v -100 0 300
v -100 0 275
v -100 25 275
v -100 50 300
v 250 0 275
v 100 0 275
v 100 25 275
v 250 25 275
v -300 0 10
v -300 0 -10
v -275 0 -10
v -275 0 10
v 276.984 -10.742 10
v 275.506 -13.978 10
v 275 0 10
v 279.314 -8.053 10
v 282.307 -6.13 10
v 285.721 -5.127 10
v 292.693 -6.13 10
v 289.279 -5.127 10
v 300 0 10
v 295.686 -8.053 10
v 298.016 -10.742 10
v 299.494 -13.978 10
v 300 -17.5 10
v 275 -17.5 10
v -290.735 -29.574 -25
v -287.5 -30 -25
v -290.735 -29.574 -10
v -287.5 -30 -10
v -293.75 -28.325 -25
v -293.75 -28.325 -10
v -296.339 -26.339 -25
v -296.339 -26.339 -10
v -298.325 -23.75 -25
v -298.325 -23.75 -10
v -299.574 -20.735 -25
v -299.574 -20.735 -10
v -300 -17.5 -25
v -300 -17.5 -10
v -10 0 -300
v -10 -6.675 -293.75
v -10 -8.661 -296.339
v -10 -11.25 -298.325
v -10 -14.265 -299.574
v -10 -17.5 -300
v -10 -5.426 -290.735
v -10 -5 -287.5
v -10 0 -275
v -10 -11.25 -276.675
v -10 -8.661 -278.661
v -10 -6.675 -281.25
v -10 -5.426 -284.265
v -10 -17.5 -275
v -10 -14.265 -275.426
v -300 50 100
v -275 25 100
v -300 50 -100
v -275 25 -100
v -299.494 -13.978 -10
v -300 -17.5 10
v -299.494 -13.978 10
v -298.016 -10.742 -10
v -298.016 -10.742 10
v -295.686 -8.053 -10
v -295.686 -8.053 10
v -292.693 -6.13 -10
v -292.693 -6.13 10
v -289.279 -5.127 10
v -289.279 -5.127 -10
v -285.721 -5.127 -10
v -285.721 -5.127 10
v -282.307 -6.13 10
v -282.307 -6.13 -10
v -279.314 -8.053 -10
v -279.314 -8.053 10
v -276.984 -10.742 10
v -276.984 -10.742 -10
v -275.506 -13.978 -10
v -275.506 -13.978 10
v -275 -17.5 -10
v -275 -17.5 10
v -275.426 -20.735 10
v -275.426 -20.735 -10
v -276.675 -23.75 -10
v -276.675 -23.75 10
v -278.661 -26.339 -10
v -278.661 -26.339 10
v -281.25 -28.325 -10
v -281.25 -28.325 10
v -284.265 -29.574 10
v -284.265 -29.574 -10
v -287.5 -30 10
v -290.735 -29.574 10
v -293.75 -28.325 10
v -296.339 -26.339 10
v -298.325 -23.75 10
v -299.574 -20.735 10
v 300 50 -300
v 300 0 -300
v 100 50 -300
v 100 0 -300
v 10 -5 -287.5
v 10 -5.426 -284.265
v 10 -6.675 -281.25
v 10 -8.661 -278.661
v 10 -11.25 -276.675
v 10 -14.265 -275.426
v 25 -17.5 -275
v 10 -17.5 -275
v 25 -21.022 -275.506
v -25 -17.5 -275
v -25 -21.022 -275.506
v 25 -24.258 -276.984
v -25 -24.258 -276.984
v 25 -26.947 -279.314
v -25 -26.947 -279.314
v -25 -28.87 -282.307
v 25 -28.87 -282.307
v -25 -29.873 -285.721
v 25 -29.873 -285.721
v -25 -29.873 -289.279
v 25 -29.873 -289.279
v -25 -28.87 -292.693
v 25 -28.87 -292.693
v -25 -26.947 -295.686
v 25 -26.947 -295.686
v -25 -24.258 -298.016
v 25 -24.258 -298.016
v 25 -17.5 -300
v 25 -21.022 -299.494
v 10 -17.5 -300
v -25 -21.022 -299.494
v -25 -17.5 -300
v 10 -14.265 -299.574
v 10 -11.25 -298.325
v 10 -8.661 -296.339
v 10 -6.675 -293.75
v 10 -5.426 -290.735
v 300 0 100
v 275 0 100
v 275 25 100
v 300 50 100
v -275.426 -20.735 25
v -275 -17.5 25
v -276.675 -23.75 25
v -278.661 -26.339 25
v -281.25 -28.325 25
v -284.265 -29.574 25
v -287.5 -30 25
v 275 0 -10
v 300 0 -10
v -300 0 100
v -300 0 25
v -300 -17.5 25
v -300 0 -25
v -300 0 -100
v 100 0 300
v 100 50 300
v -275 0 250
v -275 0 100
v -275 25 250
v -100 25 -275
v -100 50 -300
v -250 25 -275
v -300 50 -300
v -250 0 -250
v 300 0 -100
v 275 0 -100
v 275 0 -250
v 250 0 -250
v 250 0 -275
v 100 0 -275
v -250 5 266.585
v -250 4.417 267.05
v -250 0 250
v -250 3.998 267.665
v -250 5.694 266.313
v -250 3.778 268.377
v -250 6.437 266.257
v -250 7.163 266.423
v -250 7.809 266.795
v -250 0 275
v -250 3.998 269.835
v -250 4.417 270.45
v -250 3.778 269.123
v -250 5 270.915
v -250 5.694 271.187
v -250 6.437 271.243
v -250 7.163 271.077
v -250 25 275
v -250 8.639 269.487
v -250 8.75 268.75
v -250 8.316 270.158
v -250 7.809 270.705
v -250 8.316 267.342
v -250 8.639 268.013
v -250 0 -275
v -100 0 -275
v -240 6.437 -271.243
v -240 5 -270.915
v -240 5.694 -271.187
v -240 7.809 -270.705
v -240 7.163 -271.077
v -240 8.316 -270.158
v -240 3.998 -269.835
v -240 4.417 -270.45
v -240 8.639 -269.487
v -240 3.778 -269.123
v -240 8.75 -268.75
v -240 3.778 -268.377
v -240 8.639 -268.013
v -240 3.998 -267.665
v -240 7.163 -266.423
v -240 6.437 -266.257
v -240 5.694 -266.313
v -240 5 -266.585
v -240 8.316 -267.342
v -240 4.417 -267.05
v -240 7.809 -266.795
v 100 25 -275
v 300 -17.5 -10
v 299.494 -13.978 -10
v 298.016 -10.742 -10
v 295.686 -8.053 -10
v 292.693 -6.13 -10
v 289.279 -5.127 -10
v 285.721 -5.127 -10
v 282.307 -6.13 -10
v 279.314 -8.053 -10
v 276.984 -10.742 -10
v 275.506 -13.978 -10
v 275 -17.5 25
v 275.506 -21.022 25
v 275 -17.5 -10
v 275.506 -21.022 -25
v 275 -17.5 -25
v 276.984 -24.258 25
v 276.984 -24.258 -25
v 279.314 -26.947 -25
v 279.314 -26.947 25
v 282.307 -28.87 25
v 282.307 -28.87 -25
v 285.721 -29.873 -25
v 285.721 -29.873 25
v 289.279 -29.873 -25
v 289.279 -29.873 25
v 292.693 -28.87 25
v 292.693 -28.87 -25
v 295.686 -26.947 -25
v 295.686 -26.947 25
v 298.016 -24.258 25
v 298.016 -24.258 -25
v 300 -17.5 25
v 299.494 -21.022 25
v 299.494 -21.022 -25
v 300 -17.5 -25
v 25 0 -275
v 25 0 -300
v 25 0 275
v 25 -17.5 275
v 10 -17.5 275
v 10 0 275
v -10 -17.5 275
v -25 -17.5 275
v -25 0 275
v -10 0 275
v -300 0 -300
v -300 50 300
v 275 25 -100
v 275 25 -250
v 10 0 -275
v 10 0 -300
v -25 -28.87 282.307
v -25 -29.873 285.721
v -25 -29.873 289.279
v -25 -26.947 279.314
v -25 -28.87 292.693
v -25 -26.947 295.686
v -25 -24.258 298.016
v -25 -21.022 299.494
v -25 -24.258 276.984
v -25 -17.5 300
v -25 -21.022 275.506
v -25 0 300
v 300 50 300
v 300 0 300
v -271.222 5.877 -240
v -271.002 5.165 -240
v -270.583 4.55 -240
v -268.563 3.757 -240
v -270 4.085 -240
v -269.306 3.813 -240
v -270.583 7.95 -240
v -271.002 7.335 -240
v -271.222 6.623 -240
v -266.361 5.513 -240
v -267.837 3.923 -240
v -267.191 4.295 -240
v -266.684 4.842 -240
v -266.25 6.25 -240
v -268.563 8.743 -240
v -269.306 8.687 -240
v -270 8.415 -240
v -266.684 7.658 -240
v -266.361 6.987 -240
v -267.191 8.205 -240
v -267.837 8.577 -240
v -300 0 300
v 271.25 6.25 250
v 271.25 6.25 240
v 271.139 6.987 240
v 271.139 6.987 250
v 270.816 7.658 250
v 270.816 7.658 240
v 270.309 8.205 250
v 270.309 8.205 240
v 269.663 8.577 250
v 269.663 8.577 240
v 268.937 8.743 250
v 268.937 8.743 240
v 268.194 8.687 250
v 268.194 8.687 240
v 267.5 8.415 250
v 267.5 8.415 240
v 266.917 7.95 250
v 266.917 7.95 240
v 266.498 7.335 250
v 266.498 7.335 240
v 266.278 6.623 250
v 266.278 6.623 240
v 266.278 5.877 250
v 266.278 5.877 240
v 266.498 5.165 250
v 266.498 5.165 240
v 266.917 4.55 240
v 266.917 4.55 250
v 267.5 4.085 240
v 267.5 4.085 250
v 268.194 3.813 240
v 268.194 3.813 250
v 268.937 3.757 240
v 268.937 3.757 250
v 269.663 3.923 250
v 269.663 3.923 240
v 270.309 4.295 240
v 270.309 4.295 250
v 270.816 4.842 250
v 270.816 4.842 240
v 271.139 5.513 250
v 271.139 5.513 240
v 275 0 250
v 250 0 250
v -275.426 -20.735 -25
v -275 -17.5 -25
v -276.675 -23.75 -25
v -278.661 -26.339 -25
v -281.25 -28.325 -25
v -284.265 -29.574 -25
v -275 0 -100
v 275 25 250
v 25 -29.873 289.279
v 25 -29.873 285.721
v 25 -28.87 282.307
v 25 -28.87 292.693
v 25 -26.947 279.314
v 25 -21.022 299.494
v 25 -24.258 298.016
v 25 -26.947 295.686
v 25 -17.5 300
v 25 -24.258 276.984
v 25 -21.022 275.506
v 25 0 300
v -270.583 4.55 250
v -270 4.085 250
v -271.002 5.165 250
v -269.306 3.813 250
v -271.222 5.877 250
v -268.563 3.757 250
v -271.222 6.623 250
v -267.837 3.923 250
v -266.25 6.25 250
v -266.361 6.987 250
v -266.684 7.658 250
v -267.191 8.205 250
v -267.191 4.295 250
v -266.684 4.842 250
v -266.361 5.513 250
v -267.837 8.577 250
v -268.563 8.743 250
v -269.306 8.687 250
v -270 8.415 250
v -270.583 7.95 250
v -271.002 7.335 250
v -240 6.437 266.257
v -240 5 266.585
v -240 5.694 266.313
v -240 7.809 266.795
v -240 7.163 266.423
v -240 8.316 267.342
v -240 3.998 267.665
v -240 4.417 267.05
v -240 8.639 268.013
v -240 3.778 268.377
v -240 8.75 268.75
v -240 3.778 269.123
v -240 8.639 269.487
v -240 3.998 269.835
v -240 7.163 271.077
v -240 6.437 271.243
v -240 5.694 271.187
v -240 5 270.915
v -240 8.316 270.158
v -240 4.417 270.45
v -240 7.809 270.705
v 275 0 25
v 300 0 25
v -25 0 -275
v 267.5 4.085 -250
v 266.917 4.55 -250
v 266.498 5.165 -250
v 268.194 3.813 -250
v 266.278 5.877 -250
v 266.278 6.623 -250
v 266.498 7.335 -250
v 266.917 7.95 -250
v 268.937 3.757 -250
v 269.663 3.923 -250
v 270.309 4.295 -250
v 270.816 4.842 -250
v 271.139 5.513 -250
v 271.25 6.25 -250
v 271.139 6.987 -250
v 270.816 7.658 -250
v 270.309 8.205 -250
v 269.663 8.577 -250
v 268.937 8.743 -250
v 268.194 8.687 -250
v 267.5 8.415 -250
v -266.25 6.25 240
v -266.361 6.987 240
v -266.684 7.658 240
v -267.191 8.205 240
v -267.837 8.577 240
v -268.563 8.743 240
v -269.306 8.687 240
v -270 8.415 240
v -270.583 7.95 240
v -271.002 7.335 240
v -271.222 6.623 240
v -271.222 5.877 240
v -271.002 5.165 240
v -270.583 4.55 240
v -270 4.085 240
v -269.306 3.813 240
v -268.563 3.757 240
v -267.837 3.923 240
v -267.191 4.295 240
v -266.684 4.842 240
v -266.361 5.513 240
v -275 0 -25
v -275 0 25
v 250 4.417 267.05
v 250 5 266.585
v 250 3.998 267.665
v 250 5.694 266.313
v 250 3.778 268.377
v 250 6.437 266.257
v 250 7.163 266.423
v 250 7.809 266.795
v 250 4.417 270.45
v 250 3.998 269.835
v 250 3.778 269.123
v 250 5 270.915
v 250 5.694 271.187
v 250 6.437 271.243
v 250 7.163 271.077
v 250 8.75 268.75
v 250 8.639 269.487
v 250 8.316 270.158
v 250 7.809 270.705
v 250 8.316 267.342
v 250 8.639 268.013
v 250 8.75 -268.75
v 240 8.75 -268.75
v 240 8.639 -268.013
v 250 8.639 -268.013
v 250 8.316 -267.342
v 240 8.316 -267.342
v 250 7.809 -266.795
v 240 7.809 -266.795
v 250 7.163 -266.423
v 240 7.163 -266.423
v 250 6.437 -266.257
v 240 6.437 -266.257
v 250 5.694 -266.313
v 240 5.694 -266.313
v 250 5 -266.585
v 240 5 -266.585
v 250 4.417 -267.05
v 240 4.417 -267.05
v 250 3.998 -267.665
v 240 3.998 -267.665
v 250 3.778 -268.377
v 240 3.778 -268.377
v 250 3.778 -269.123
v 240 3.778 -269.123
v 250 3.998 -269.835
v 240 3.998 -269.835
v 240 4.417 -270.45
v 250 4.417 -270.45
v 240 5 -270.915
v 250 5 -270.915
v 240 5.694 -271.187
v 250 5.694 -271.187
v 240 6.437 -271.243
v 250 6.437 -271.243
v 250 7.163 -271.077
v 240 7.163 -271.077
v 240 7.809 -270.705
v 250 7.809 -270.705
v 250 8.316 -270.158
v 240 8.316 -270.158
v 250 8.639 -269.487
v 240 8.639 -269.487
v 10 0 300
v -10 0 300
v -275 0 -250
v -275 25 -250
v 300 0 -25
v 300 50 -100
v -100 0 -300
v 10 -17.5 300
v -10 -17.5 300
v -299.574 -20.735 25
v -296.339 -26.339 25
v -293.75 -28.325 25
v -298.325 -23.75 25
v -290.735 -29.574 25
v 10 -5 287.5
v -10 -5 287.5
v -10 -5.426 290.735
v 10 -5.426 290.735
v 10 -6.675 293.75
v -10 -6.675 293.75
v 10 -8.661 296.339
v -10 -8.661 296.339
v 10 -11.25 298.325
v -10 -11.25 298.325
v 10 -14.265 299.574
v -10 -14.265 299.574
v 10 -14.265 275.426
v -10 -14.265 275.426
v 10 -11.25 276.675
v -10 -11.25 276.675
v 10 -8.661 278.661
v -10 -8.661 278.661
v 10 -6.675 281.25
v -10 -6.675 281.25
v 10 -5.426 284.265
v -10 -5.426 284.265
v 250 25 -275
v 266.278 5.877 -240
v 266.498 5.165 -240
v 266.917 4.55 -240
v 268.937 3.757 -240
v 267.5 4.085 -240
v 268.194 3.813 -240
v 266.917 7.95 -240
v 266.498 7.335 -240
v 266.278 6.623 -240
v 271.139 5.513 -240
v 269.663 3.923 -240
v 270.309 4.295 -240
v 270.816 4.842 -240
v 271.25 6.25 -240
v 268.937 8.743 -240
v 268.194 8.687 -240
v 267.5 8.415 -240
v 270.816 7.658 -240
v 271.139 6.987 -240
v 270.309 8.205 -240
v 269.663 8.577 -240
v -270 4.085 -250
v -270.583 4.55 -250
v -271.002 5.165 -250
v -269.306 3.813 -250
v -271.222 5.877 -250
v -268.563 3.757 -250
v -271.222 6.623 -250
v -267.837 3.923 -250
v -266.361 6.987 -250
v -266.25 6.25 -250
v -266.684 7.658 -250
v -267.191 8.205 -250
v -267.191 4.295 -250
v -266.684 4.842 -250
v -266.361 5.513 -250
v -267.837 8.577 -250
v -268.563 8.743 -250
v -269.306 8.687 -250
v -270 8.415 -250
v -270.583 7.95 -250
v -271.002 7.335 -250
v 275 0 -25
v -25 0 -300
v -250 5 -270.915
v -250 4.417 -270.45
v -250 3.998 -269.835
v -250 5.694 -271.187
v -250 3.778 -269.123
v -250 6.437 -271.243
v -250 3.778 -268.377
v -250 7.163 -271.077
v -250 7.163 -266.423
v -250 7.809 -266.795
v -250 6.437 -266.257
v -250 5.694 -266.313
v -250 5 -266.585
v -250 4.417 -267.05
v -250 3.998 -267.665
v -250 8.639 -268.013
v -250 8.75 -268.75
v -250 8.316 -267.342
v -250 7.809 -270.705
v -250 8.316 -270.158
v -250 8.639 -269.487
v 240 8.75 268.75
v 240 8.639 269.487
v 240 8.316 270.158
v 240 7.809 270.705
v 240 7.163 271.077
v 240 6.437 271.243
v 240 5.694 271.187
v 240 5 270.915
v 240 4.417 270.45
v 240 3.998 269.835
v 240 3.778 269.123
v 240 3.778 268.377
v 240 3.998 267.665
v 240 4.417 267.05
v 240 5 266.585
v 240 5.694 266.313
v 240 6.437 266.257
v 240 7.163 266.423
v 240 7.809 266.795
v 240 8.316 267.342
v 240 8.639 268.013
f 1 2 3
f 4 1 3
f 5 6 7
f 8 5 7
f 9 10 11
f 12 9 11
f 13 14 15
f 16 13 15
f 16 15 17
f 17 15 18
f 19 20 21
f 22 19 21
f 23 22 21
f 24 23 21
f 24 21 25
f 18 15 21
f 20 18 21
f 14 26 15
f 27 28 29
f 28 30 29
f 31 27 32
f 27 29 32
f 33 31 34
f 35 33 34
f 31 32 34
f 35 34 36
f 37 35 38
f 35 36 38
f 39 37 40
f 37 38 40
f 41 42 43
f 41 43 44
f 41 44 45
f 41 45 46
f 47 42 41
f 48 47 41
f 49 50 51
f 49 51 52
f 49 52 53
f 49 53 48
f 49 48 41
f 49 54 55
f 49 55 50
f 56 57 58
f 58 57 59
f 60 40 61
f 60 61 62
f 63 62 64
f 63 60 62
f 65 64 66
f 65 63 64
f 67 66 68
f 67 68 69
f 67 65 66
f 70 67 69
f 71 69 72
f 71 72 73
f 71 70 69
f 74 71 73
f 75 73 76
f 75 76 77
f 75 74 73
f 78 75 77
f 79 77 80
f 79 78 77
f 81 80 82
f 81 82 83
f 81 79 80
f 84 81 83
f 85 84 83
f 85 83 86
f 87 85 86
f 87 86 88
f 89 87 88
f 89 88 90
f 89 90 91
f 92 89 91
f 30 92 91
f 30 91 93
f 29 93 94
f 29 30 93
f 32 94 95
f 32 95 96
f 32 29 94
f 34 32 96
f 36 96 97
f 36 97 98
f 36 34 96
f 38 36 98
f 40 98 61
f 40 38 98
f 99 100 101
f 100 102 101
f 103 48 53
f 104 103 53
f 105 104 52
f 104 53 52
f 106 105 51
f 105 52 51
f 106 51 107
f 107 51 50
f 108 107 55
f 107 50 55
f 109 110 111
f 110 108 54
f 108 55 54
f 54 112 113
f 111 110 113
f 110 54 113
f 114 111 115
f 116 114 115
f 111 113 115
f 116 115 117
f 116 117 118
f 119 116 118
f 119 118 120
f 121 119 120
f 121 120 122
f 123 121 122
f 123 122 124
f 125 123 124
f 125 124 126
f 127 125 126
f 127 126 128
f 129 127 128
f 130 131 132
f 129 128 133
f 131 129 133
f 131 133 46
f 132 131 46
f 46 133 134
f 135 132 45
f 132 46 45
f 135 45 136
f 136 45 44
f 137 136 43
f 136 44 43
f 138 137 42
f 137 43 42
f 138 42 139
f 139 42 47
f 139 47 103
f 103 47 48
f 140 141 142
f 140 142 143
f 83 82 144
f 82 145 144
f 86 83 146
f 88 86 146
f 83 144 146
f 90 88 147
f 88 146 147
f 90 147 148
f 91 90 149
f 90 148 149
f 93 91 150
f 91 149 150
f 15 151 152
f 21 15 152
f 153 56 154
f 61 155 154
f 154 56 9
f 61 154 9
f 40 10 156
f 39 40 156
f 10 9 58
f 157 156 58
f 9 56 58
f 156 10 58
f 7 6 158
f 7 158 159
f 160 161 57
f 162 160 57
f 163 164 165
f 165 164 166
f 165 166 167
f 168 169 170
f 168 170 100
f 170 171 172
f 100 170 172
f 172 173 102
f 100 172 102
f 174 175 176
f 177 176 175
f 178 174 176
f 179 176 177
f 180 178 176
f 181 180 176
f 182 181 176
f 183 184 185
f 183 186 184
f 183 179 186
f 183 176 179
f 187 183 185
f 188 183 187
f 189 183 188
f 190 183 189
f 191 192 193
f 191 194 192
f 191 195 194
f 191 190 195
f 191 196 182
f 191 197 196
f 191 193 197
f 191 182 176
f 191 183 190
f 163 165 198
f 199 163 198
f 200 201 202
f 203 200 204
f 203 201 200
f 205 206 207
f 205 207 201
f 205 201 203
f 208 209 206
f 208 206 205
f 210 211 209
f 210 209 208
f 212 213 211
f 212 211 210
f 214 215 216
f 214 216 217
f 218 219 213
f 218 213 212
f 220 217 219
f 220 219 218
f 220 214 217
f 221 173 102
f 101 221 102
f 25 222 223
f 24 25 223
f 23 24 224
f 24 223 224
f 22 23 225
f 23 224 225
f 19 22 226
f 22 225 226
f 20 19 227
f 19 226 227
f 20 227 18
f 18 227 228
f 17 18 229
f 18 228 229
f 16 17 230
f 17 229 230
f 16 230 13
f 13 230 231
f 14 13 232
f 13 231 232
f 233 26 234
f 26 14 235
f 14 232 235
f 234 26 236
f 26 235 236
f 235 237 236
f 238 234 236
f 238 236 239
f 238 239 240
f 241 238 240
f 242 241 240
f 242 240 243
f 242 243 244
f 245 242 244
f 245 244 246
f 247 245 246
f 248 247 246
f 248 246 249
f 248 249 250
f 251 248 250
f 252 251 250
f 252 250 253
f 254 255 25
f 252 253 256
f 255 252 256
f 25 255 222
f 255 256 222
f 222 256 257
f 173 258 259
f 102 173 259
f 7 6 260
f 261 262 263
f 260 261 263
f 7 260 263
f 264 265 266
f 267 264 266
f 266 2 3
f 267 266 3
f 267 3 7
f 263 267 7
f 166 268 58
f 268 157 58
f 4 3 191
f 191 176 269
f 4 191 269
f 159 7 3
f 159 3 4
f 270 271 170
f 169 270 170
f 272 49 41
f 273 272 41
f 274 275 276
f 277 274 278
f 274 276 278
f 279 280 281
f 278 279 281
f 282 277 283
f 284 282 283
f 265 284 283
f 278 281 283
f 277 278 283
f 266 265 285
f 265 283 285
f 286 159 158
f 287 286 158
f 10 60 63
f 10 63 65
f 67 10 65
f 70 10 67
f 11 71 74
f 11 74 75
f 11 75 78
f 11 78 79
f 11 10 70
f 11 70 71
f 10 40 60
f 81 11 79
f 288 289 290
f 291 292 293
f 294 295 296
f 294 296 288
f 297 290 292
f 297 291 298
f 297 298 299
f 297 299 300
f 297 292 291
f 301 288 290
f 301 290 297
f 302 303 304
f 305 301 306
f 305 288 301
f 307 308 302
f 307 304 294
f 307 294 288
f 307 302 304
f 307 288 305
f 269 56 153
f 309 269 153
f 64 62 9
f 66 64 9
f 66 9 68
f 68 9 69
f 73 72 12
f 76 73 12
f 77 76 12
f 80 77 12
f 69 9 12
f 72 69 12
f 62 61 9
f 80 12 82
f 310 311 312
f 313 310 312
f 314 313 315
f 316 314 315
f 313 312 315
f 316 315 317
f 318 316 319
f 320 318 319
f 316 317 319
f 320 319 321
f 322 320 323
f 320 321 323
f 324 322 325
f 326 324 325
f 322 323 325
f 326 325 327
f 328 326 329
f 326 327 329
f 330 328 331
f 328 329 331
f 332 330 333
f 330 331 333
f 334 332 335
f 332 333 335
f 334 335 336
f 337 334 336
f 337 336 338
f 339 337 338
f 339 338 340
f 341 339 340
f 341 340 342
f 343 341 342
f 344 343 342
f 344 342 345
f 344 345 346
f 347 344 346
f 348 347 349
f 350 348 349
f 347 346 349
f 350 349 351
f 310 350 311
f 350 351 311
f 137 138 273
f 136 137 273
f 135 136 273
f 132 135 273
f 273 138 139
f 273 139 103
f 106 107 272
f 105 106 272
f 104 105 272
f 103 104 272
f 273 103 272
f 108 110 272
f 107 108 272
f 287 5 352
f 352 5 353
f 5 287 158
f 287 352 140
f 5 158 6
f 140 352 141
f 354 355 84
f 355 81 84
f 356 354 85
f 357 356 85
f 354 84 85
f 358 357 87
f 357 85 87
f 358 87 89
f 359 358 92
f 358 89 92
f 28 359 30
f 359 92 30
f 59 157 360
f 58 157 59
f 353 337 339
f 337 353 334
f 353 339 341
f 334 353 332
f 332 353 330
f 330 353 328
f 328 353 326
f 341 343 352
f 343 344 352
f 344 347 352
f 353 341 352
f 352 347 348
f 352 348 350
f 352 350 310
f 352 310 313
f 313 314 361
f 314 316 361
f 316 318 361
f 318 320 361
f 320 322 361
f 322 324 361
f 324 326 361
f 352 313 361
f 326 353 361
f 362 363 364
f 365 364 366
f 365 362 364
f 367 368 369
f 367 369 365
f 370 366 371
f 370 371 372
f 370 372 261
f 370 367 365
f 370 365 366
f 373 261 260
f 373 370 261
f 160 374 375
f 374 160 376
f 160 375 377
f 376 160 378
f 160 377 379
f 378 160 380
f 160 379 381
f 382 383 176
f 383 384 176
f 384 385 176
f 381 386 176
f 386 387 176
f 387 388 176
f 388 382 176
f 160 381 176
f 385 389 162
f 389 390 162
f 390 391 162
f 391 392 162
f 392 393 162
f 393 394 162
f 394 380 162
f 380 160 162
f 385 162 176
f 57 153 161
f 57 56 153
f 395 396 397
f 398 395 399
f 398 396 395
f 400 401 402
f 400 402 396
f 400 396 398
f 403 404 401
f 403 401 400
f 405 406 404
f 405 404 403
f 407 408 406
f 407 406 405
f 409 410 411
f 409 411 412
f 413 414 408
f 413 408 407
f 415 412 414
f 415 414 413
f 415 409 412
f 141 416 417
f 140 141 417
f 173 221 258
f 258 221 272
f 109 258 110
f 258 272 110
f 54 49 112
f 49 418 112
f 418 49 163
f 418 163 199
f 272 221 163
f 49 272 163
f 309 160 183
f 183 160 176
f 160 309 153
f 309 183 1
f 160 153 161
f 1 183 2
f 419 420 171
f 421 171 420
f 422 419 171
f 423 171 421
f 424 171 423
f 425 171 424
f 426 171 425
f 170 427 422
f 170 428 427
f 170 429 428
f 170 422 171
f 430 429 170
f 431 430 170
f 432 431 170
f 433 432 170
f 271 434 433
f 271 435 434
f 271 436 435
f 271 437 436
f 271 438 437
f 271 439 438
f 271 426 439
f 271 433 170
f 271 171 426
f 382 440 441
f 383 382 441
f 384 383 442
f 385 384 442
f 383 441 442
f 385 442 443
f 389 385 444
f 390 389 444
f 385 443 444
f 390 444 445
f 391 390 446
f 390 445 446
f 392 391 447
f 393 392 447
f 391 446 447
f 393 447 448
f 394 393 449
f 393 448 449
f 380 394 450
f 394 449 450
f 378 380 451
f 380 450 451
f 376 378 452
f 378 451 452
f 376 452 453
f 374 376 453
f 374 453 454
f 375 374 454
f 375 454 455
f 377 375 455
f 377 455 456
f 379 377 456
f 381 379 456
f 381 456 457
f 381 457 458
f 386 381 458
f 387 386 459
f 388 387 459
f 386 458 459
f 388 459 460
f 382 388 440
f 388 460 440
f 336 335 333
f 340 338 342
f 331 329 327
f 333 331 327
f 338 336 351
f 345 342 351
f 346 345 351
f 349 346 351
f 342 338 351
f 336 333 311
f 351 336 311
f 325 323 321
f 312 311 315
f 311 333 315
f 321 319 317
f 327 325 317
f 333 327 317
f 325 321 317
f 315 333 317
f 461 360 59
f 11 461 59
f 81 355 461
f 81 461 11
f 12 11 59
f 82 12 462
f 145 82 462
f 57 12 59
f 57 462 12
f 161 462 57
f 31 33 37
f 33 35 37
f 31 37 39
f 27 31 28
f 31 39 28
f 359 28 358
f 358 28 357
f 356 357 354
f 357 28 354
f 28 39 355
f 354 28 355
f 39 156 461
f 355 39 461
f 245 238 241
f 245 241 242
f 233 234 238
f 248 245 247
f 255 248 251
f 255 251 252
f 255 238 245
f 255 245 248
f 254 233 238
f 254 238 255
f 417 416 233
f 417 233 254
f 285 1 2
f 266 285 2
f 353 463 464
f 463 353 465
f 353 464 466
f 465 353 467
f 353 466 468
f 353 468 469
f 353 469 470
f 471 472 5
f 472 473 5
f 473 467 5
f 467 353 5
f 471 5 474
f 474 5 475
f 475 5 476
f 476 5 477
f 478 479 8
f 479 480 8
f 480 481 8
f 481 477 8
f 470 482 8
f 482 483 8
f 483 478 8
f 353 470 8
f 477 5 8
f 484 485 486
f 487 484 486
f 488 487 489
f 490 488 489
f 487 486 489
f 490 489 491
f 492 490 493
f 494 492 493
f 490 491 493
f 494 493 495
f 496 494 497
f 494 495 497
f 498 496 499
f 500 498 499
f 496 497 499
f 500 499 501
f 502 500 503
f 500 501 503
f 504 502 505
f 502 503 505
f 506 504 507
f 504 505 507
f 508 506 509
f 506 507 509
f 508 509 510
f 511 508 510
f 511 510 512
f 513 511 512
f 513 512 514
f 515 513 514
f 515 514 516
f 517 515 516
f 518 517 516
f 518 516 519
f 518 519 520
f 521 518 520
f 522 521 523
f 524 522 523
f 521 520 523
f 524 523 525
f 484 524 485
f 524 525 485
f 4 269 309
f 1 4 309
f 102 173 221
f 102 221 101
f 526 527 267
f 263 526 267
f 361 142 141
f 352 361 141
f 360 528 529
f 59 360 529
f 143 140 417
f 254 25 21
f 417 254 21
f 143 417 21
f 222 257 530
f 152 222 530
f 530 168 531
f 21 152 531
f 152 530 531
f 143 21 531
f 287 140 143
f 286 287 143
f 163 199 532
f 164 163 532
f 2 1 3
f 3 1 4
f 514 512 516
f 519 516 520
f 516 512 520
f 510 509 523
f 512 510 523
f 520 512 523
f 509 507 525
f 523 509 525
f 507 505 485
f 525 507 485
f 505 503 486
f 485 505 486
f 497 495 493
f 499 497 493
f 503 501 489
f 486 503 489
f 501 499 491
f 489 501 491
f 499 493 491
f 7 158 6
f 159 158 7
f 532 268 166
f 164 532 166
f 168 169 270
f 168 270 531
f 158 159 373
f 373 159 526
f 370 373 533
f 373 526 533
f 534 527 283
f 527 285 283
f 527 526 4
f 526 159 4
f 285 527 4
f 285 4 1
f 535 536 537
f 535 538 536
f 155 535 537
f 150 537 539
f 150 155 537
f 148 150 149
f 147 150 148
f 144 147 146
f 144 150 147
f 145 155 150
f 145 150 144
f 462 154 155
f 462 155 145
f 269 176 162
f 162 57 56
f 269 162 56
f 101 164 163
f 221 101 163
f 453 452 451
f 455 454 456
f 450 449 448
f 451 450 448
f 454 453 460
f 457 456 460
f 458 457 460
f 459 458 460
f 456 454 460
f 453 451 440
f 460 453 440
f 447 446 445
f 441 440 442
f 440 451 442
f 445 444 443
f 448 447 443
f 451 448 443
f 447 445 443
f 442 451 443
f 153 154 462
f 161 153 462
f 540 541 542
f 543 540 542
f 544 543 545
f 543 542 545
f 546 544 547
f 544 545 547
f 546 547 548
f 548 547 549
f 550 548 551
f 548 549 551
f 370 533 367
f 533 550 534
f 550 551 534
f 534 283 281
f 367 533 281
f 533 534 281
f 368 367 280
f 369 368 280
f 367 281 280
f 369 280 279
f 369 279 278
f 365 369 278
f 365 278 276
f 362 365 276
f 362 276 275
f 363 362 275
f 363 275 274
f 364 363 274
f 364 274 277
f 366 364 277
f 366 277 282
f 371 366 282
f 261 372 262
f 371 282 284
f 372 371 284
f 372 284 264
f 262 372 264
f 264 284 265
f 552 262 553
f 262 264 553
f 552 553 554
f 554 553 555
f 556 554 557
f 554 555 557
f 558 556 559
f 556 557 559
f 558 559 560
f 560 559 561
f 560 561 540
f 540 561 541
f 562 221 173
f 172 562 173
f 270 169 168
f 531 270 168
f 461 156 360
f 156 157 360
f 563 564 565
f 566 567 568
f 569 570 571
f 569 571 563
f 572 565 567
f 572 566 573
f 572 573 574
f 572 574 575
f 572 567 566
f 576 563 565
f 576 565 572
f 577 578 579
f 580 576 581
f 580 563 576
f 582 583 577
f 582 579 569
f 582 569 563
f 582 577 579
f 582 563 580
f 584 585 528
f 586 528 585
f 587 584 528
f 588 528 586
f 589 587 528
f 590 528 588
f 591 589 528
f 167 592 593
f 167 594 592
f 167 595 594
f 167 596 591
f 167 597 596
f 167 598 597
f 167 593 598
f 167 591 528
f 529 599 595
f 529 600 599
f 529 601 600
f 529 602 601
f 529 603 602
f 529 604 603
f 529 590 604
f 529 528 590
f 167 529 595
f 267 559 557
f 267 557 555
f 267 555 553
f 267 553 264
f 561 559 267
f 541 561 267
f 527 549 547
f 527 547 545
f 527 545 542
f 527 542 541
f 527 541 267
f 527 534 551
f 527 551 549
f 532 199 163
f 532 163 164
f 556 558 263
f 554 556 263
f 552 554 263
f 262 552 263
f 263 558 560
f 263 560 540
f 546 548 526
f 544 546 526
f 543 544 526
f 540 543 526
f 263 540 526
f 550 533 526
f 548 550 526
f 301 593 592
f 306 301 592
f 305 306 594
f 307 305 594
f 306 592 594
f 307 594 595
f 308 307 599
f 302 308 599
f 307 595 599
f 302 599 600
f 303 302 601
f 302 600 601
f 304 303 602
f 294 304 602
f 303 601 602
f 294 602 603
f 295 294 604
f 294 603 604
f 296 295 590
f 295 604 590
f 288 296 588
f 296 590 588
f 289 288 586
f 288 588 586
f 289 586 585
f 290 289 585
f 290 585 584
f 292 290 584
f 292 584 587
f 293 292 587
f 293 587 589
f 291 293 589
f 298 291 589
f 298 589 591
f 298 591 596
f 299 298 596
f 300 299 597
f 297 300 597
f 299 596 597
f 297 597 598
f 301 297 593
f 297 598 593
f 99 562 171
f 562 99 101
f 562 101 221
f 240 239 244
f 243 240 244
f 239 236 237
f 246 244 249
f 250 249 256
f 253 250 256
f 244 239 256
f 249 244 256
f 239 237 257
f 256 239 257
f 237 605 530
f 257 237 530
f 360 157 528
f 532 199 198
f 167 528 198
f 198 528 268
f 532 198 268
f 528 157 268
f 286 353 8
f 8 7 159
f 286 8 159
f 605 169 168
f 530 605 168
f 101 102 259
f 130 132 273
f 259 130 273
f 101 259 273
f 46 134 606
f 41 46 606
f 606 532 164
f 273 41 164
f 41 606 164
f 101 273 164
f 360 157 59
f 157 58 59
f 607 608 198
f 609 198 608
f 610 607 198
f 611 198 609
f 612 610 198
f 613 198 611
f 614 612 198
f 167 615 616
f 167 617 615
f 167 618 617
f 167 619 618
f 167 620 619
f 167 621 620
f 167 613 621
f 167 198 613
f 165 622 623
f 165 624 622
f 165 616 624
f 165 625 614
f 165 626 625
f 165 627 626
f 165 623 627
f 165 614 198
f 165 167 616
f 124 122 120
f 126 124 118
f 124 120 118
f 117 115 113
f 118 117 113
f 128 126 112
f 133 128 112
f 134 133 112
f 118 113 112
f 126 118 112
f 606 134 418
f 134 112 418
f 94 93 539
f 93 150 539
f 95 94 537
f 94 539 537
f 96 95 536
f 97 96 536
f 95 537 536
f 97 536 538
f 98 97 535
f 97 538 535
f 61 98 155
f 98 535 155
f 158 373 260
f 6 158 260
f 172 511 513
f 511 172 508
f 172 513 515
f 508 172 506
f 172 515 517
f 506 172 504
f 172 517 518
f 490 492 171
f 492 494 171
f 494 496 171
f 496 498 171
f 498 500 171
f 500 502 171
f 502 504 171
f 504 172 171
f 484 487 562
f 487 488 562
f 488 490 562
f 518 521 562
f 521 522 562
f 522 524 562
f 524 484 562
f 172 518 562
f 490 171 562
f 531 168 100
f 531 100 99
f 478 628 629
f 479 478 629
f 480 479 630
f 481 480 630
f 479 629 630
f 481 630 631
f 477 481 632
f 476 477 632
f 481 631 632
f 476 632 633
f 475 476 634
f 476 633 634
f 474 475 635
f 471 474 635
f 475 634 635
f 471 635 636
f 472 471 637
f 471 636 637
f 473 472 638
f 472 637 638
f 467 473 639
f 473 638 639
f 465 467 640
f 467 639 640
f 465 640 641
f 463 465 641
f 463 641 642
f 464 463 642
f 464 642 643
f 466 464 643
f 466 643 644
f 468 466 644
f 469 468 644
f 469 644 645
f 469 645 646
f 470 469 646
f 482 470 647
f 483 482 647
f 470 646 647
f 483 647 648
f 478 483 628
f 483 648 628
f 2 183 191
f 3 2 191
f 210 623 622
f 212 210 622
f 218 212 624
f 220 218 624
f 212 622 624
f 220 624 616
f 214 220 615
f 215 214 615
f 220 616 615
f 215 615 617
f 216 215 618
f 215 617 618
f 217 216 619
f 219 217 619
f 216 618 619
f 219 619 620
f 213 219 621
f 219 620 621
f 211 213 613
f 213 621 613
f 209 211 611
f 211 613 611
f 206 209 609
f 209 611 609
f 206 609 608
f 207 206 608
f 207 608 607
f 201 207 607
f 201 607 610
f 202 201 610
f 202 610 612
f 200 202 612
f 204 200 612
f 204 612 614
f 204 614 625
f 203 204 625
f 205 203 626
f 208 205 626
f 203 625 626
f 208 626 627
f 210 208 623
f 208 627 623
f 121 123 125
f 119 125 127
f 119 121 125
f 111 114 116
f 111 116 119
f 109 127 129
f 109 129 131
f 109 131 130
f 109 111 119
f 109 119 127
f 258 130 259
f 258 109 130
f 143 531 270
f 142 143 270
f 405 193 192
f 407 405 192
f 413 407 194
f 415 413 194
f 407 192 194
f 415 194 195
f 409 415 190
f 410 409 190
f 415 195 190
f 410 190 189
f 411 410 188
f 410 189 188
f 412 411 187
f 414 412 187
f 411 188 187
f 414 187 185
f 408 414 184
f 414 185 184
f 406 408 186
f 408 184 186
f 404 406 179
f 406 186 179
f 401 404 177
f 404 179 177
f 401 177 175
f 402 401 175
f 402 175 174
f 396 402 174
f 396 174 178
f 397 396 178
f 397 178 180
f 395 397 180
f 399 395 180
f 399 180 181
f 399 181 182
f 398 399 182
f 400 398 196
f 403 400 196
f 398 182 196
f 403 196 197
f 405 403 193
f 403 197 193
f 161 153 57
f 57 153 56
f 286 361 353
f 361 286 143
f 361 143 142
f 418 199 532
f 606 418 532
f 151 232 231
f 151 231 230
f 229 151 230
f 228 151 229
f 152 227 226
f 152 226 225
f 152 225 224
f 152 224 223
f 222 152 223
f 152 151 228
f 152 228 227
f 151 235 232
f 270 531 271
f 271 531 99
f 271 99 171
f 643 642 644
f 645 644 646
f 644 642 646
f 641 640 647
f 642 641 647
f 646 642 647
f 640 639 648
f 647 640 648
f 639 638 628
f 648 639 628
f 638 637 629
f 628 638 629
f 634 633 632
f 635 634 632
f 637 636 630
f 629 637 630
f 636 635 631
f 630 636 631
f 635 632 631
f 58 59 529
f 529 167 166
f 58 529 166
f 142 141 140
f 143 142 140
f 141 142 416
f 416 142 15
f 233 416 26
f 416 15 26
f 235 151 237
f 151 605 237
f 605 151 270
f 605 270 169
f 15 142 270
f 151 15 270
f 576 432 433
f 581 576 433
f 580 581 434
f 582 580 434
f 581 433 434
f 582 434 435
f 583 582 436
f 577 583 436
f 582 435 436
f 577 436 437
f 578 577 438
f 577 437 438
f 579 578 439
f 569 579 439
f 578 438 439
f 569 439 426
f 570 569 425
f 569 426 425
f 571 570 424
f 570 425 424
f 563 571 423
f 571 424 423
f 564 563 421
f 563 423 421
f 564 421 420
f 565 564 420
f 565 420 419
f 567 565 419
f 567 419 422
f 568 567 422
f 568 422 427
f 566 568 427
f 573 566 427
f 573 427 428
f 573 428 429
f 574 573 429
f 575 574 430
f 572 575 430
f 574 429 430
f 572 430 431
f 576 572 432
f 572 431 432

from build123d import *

# Parameters (mm, degrees)
SKETCH1_W                                  = 700
SKETCH1_H                                  = 700
SKETCH1_W_2                                = 500
SKETCH1_H_2                                = 500
BOSS_EXTRUDE2_DEPTH                        = 50
BOSS_EXTRUDE2_DRAFT                        = 45
SKETCH6_W                                  = 700
SKETCH6_H                                  = 700
SKETCH6_W_2                                = 600
SKETCH6_H_2                                = 600
CUT_EXTRUDE1_DEPTH                         = 50
CUT_EXTRUDE2_DEPTH                         = 25
SKETCH8_R                                  = 2.5
BOSS_EXTRUDE3_DEPTH                        = 10
MIRROR1_AT_THE_SECOND_PLANE_COPY_1_SKETC_R = 2.5
MIRROR1_AT_THE_SECOND_PLANE_COPY_1_DEPTH   = 10
MIRROR2_COPY_1_SKETCH_R                    = 2.5
MIRROR2_COPY_1_DEPTH                       = 10
MIRROR2_COPY_2_SKETCH_R                    = 2.5
MIRROR2_COPY_2_DEPTH                       = 10
MIRROR2_COPY_3_SKETCH_R                    = 2.5
MIRROR2_COPY_3_DEPTH                       = 10
SKETCH9_W                                  = 25
SKETCH9_H                                  = 15
BOSS_EXTRUDE4_DEPTH                        = 30
SKETCH11_R                                 = 12.5
BOSS_EXTRUDE5_DEPTH                        = 50
FILLET1_R                                  = 12.5
FILLET1_OF_MIRROR3_R                       = 12.5
MIRROR4_START                              = -25
MIRROR4_OUTLINE_R                          = 12.5
MIRROR4_DEPTH                              = 50
MIRROR4_2_DEPTH                            = 15
MIRROR4_START_2                            = 10
MIRROR4_3_DEPTH                            = 15
INTERSECT1_START                           = -300
INTERSECT1_DEPTH                           = 200
INTERSECT1_2_DEPTH                         = 50
INTERSECT1_START_2                         = -250
INTERSECT1_3_OUTLINE_R                     = 2.5
INTERSECT1_3_DEPTH                         = 10
INTERSECT1_4_DEPTH                         = 200
INTERSECT1_START_3                         = -279.452
INTERSECT1_5_DEPTH                         = 29.452
INTERSECT1_6_OUTLINE_R                     = 2.5
INTERSECT1_6_DEPTH                         = 10
INTERSECT1_7_DEPTH                         = 600
INTERSECT1_8_DEPTH                         = 200
INTERSECT1_START_4                         = 100
INTERSECT1_9_DEPTH                         = 200
INTERSECT1_START_5                         = -100
INTERSECT1_10_DEPTH                        = 200
INTERSECT1_START_6                         = -25
INTERSECT1_11_OUTLINE_R                    = 12.5
INTERSECT1_11_DEPTH                        = 50
INTERSECT1_12_DEPTH                        = 15
INTERSECT1_START_7                         = 10
INTERSECT1_13_DEPTH                        = 15
INTERSECT1_14_DEPTH                        = 200
INTERSECT1_START_8                         = 250
INTERSECT1_15_DEPTH                        = 50
INTERSECT1_START_9                         = 240
INTERSECT1_16_OUTLINE_R                    = 2.5
INTERSECT1_16_DEPTH                        = 10
INTERSECT1_17_DEPTH                        = 200
INTERSECT1_START_10                        = -280.548
INTERSECT1_18_DEPTH                        = 30.548
INTERSECT1_19_OUTLINE_R                    = 2.5
INTERSECT1_19_DEPTH                        = 10
INTERSECT1_20_DEPTH                        = 200
INTERSECT1_21_OUTLINE_R                    = 12.5
INTERSECT1_21_DEPTH                        = 50
INTERSECT1_22_DEPTH                        = 15
INTERSECT1_23_DEPTH                        = 15
INTERSECT1_24_DEPTH                        = 200
INTERSECT1_25_OUTLINE_R                    = 12.5
INTERSECT1_25_DEPTH                        = 50
INTERSECT1_26_DEPTH                        = 15
INTERSECT1_27_DEPTH                        = 15
INTERSECT1_28_DEPTH                        = 200
INTERSECT1_29_DEPTH                        = 50
INTERSECT1_30_OUTLINE_R                    = 2.5
INTERSECT1_30_DEPTH                        = 10
INTERSECT1_31_DEPTH                        = 200
INTERSECT1_32_DEPTH                        = 30.548
INTERSECT1_33_OUTLINE_R                    = 2.5
INTERSECT1_33_DEPTH                        = 10
INTERSECT1_34_DEPTH                        = 200
INTERSECT1_35_DEPTH                        = 50
INTERSECT1_36_OUTLINE_R                    = 2.5
INTERSECT1_36_DEPTH                        = 10
INTERSECT1_37_DEPTH                        = 200
INTERSECT1_38_DEPTH                        = 30.548
INTERSECT1_39_OUTLINE_R                    = 2.5
INTERSECT1_39_DEPTH                        = 10


with BuildPart() as part:
    # Sketch1 → Boss-Extrude2 (with draft: the straight prism first)
    with BuildSketch(Plane(origin=(0, 0, 0), x_dir=(1, 0, 0), z_dir=(0, 1, 0))):
        Rectangle(SKETCH1_W, SKETCH1_H)
        Rectangle(SKETCH1_W_2, SKETCH1_H_2, mode=Mode.SUBTRACT)
    extrude(amount=BOSS_EXTRUDE2_DEPTH)
    # Boss-Extrude2: the draft: its side faces are tilted about the plane it starts from
    boss_extrude2_sides = [part.faces().sort_by_distance(p)[0] for p in [
        (-350, 25, 0),
        (0, 25, 350),
        (350, 25, 0),
        (0, 25, -350),
        (250, 25, 0),
        (0, 25, 250),
        (-250, 25, 0),
        (0, 25, -250),
    ]]
    draft(boss_extrude2_sides, Plane(origin=(0, 0, 0), x_dir=(1, 0, 0), z_dir=(0, 1, 0)), BOSS_EXTRUDE2_DRAFT)

    # Sketch6 → Cut-Extrude1 (cut)
    with BuildSketch(Plane(origin=(0, 50, 0), x_dir=(1, 0, 0), z_dir=(0, 1, 0))):
        Rectangle(SKETCH6_W, SKETCH6_H)
        Rectangle(SKETCH6_W_2, SKETCH6_H_2, mode=Mode.SUBTRACT)
    extrude(amount=-CUT_EXTRUDE1_DEPTH, mode=Mode.SUBTRACT)

    # Sketch7 → Cut-Extrude2 (cut)
    with BuildSketch(Plane.XZ):
        Polygon((-275, 250), (-250, 250), (-250, 275), (250, 275), (250, 250), (275, 250), (275, -250), (250, -250), (250, -275), (-250, -275), (-250, -250), (-275, -250), align=None)
    extrude(amount=-CUT_EXTRUDE2_DEPTH, mode=Mode.SUBTRACT)

    # Sketch8 → Boss-Extrude3 (add)
    with BuildSketch(Plane.XY.offset(-250)):
        with Locations(Location((-268.75, 6.25, 0), (0, 0, 180))):
            Circle(SKETCH8_R)
    boss_extrude3 = extrude(amount=BOSS_EXTRUDE3_DEPTH)

    # Mirror1: Boss-Extrude3 across plane
    add(boss_extrude3.mirror(Plane(origin=(0, 0, 0), x_dir=(0, 0, 1), z_dir=(1, 0, 0))))

    # Mirror1 at the second plane: Boss-Extrude3 across plane
    add(boss_extrude3.mirror(Plane.XY))

    # Mirror1 at the second plane copy 1 sketc → Mirror1 at the second plane copy 1 (add)
    with BuildSketch(Plane(origin=(0, 0, 250), x_dir=(-1, 0, 0), z_dir=(0, 0, -1))):
        with Locations(Location((-268.75, 6.25, 0), (0, 0, 180))):
            Circle(MIRROR1_AT_THE_SECOND_PLANE_COPY_1_SKETC_R)
    extrude(amount=MIRROR1_AT_THE_SECOND_PLANE_COPY_1_DEPTH)

    # Mirror2: Boss-Extrude3 across plane
    add(boss_extrude3.mirror(Plane(origin=(0, 0, 0), x_dir=(0.7071067811865477, 0, 0.7071067811865474), z_dir=(-0.7071067811865474, 0, 0.7071067811865477))))

    # Mirror2 copy 1 sketch → Mirror2 copy 1 (add)
    with BuildSketch(Plane(origin=(-250, 0, 0), x_dir=(0, 0, -1), z_dir=(1, 0, 0))):
        with Locations(Location((-268.75, 6.25, 0), (0, 0, 180))):
            Circle(MIRROR2_COPY_1_SKETCH_R)
    extrude(amount=MIRROR2_COPY_1_DEPTH)

    # Mirror2 copy 2 sketch → Mirror2 copy 2 (add)
    with BuildSketch(Plane.ZY.offset(-250)):
        with Locations(Location((-268.75, 6.25, 0), (0, 0, 180))):
            Circle(MIRROR2_COPY_2_SKETCH_R)
    extrude(amount=MIRROR2_COPY_2_DEPTH)

    # Mirror2 copy 3 sketch → Mirror2 copy 3 (add)
    with BuildSketch(Plane(origin=(250, 0, 0), x_dir=(0, 0, -1), z_dir=(-1, 0, 0))):
        with Locations((-268.75, -6.25)):
            Circle(MIRROR2_COPY_3_SKETCH_R)
    extrude(amount=MIRROR2_COPY_3_DEPTH)

    # Sketch9 → Boss-Extrude4 (add)
    with BuildSketch(Plane.XZ):
        with Locations((-287.5, 17.5)):
            Rectangle(SKETCH9_W, SKETCH9_H)
        with Locations((-287.5, -17.5)):
            Rectangle(SKETCH9_W, SKETCH9_H)
    boss_extrude4 = extrude(amount=BOSS_EXTRUDE4_DEPTH)

    # Sketch11 → Boss-Extrude5 (add)
    with BuildSketch(Plane(origin=(0, 0, -25), x_dir=(-1, 0, 0), z_dir=(0, 0, -1))):
        with Locations((287.5, -17.5)):
            Circle(SKETCH11_R)
    boss_extrude5 = extrude(amount=-BOSS_EXTRUDE5_DEPTH)

    # Fillet1
    fillet1_edges = [part.edges().sort_by_distance(p)[0] for p in [
        (-275, -30, -17.5),
        (-275, -30, 17.5),
        (-300, -30, 17.5),
        (-300, -30, -17.5),
    ]]
    fillet(fillet1_edges, radius=FILLET1_R - 0.0001)  # a hair under: the kernel refuses the full size

    # Mirror3: Boss-Extrude4, Boss-Extrude5 across plane
    add(boss_extrude4.mirror(Plane(origin=(0, 0, 0), x_dir=(0, 0, 1), z_dir=(1, 0, 0))))
    add(boss_extrude5.mirror(Plane(origin=(0, 0, 0), x_dir=(0, 0, 1), z_dir=(1, 0, 0))))

    # Fillet1 of Mirror3
    fillet1_of_mirror3_edges = [part.edges().sort_by_distance(p)[0] for p in [
        (275, -30, -17.5),
        (275, -30, 17.5),
        (300, -30, 17.5),
        (300, -30, -17.5),
    ]]
    fillet(fillet1_of_mirror3_edges, radius=FILLET1_OF_MIRROR3_R - 0.0001)  # a hair under: the kernel refuses the full size



with BuildPart() as body_2:
    # Mirror4: read off the stored shape, not the designer's step
    # Mirror4 outline → Mirror4 (new body)
    with BuildSketch(Plane.YZ.offset(MIRROR4_START)):
        with Locations((-17.5, 287.5)):
            Circle(MIRROR4_OUTLINE_R)
        with Locations((-17.5, -287.5)):
            Circle(MIRROR4_OUTLINE_R)
    extrude(amount=MIRROR4_DEPTH)


with BuildPart() as part_1:
    add(part.part)

    add(body_2.part)  # Mirror4 2 merges body 2
    # Mirror4 2 outline → Mirror4 2 (add)
    with BuildSketch(Plane.YZ.offset(MIRROR4_START)):
        with BuildLine():
            ThreePointArc((-17.5, 300), (-5, 287.5), (-17.5, 275))
            Line((-17.5, 275), (0, 275))
            Line((0, 275), (0, 300))
            Line((0, 300), (-17.5, 300))
        make_face()
        with BuildLine():
            ThreePointArc((-17.5, -275), (-5, -287.5), (-17.5, -300))
            Line((-17.5, -300), (0, -300))
            Line((0, -300), (0, -275))
            Line((0, -275), (-17.5, -275))
        make_face()
    extrude(amount=MIRROR4_2_DEPTH)

    # Mirror4 3 outline → Mirror4 3 (add)
    with BuildSketch(Plane.YZ.offset(MIRROR4_START_2)):
        with BuildLine():
            ThreePointArc((-17.5, 300), (-5, 287.5), (-17.5, 275))
            Line((-17.5, 275), (0, 275))
            Line((0, 275), (0, 300))
            Line((0, 300), (-17.5, 300))
        make_face()
        with BuildLine():
            ThreePointArc((-17.5, -275), (-5, -287.5), (-17.5, -300))
            Line((-17.5, -300), (0, -300))
            Line((0, -300), (0, -275))
            Line((0, -275), (-17.5, -275))
        make_face()
    extrude(amount=MIRROR4_3_DEPTH)

    # Intersect1 7 outline → Intersect1 7 (cut)
    with BuildSketch(Plane.XY.offset(INTERSECT1_START)):
        Polygon((302, 52), (-302, 52), (-302, 0), (-300, 0), (-300, 50), (-275, 25), (-275, -32), (302, -32), align=None)
    extrude(amount=INTERSECT1_7_DEPTH, mode=Mode.SUBTRACT)

    # Intersect1 8 outline → Intersect1 8 (cut)
    with BuildSketch(Plane.XY.offset(INTERSECT1_START)):
        Polygon((-300, 0), (-275, 0), (-275, 25), (-300, 50), align=None)
    extrude(amount=INTERSECT1_8_DEPTH, mode=Mode.SUBTRACT)

    # Intersect1 9 outline → Intersect1 9 (cut)
    with BuildSketch(Plane.XY.offset(INTERSECT1_START_4)):
        Polygon((-300, 0), (-275, 0), (-275, 25), (-300, 50), align=None)
    extrude(amount=INTERSECT1_9_DEPTH, mode=Mode.SUBTRACT)


with BuildPart() as body_2_2:
    # Intersect1: read off the stored shape, not the designer's step
    # Intersect1 outline → Intersect1 (new body)
    with BuildSketch(Plane.YZ.offset(INTERSECT1_START)):
        Polygon((0, -275), (0, -300), (50, -300), (25, -275), align=None)
    extrude(amount=INTERSECT1_DEPTH)

    # Intersect1 2 outline → Intersect1 2 (add)
    with BuildSketch(Plane.YZ.offset(INTERSECT1_START)):
        Polygon((0, -250), (0, -275), (25, -275), align=None)
    extrude(amount=INTERSECT1_2_DEPTH)

    # Intersect1 3 outline → Intersect1 3 (add)
    with BuildSketch(Plane.YZ.offset(INTERSECT1_START_2)):
        with Locations((6.25, -268.75)):
            Circle(INTERSECT1_3_OUTLINE_R)
    extrude(amount=INTERSECT1_3_DEPTH)

    # Intersect1 4 outline → Intersect1 4 (add)
    with BuildSketch(Plane.XY.offset(INTERSECT1_START)):
        Polygon((-275, 25), (-300, 50), (-300, 0), (-275, 0), align=None)
    extrude(amount=INTERSECT1_4_DEPTH)

    # Intersect1 5 outline → Intersect1 5 (add)
    with BuildSketch(Plane.XY.offset(INTERSECT1_START_3)):
        Polygon((-250, 0), (-275, 25), (-275, 0), align=None)
    extrude(amount=INTERSECT1_5_DEPTH)

    # Intersect1 6 outline → Intersect1 6 (add)
    with BuildSketch(Plane.XY.offset(INTERSECT1_START_2)):
        with Locations((-268.75, 6.25)):
            Circle(INTERSECT1_6_OUTLINE_R)
    extrude(amount=INTERSECT1_6_DEPTH)


with BuildPart() as body_3:
    # Intersect1 10 outline → Intersect1 10 (new body)
    with BuildSketch(Plane.YZ.offset(INTERSECT1_START_5)):
        Polygon((0, -275), (0, -300), (50, -300), (25, -275), align=None)
    extrude(amount=INTERSECT1_10_DEPTH)

    # Intersect1 11 outline → Intersect1 11 (add)
    with BuildSketch(Plane.YZ.offset(INTERSECT1_START_6)):
        with Locations((-17.5, -287.5)):
            Circle(INTERSECT1_11_OUTLINE_R)
    extrude(amount=INTERSECT1_11_DEPTH)

    # Intersect1 12 outline → Intersect1 12 (add)
    with BuildSketch(Plane.YZ.offset(INTERSECT1_START_6)):
        with BuildLine():
            Line((-17.5, -300), (0, -300))
            Line((0, -300), (0, -275))
            Line((0, -275), (-17.5, -275))
            ThreePointArc((-17.5, -275), (-5, -287.5), (-17.5, -300))
        make_face()
    extrude(amount=INTERSECT1_12_DEPTH)

    # Intersect1 13 outline → Intersect1 13 (add)
    with BuildSketch(Plane.YZ.offset(INTERSECT1_START_7)):
        with BuildLine():
            Line((-17.5, -300), (0, -300))
            Line((0, -300), (0, -275))
            Line((0, -275), (-17.5, -275))
            ThreePointArc((-17.5, -275), (-5, -287.5), (-17.5, -300))
        make_face()
    extrude(amount=INTERSECT1_13_DEPTH)


with BuildPart() as body_4:
    # Intersect1 14 outline → Intersect1 14 (new body)
    with BuildSketch(Plane.YZ.offset(INTERSECT1_START_4)):
        Polygon((0, -275), (0, -300), (50, -300), (25, -275), align=None)
    extrude(amount=INTERSECT1_14_DEPTH)

    # Intersect1 15 outline → Intersect1 15 (add)
    with BuildSketch(Plane.YZ.offset(INTERSECT1_START_8)):
        Polygon((0, -250), (0, -275), (25, -275), align=None)
    extrude(amount=INTERSECT1_15_DEPTH)

    # Intersect1 16 outline → Intersect1 16 (add)
    with BuildSketch(Plane.YZ.offset(INTERSECT1_START_9)):
        with Locations((6.25, -268.75)):
            Circle(INTERSECT1_16_OUTLINE_R)
    extrude(amount=INTERSECT1_16_DEPTH)

    # Intersect1 17 outline → Intersect1 17 (add)
    with BuildSketch(Plane.XY.offset(INTERSECT1_START)):
        Polygon((275, 0), (300, 0), (300, 50), (275, 25), align=None)
    extrude(amount=INTERSECT1_17_DEPTH)

    # Intersect1 18 outline → Intersect1 18 (add)
    with BuildSketch(Plane.XY.offset(INTERSECT1_START_10)):
        Polygon((250, 0), (275, 0), (275, 25), align=None)
    extrude(amount=INTERSECT1_18_DEPTH)

    # Intersect1 19 outline → Intersect1 19 (add)
    with BuildSketch(Plane.XY.offset(INTERSECT1_START_2)):
        with Locations((268.75, 6.25)):
            Circle(INTERSECT1_19_OUTLINE_R)
    extrude(amount=INTERSECT1_19_DEPTH)


with BuildPart() as body_5:
    # Intersect1 20 outline → Intersect1 20 (new body)
    with BuildSketch(Plane.XY.offset(INTERSECT1_START_5)):
        Polygon((275, 0), (300, 0), (300, 50), (275, 25), align=None)
    extrude(amount=INTERSECT1_20_DEPTH)

    # Intersect1 21 outline → Intersect1 21 (add)
    with BuildSketch(Plane.XY.offset(INTERSECT1_START_6)):
        with Locations((287.5, -17.5)):
            Circle(INTERSECT1_21_OUTLINE_R)
    extrude(amount=INTERSECT1_21_DEPTH)

    # Intersect1 22 outline → Intersect1 22 (add)
    with BuildSketch(Plane.XY.offset(INTERSECT1_START_6)):
        with BuildLine():
            ThreePointArc((275, -17.5), (287.5, -5), (300, -17.5))
            Line((300, -17.5), (300, 0))
            Line((300, 0), (275, 0))
            Line((275, 0), (275, -17.5))
        make_face()
    extrude(amount=INTERSECT1_22_DEPTH)

    # Intersect1 23 outline → Intersect1 23 (add)
    with BuildSketch(Plane.XY.offset(INTERSECT1_START_7)):
        with BuildLine():
            ThreePointArc((275, -17.5), (287.5, -5), (300, -17.5))
            Line((300, -17.5), (300, 0))
            Line((300, 0), (275, 0))
            Line((275, 0), (275, -17.5))
        make_face()
    extrude(amount=INTERSECT1_23_DEPTH)


with BuildPart() as body_6:
    # Intersect1 24 outline → Intersect1 24 (new body)
    with BuildSketch(Plane.YZ.offset(INTERSECT1_START_5)):
        Polygon((50, 300), (0, 300), (0, 275), (25, 275), align=None)
    extrude(amount=INTERSECT1_24_DEPTH)

    # Intersect1 25 outline → Intersect1 25 (add)
    with BuildSketch(Plane.YZ.offset(INTERSECT1_START_6)):
        with Locations((-17.5, 287.5)):
            Circle(INTERSECT1_25_OUTLINE_R)
    extrude(amount=INTERSECT1_25_DEPTH)

    # Intersect1 26 outline → Intersect1 26 (add)
    with BuildSketch(Plane.YZ.offset(INTERSECT1_START_6)):
        with BuildLine():
            ThreePointArc((-17.5, 300), (-5, 287.5), (-17.5, 275))
            Line((-17.5, 275), (0, 275))
            Line((0, 275), (0, 300))
            Line((0, 300), (-17.5, 300))
        make_face()
    extrude(amount=INTERSECT1_26_DEPTH)

    # Intersect1 27 outline → Intersect1 27 (add)
    with BuildSketch(Plane.YZ.offset(INTERSECT1_START_7)):
        with BuildLine():
            ThreePointArc((-17.5, 300), (-5, 287.5), (-17.5, 275))
            Line((-17.5, 275), (0, 275))
            Line((0, 275), (0, 300))
            Line((0, 300), (-17.5, 300))
        make_face()
    extrude(amount=INTERSECT1_27_DEPTH)


with BuildPart() as body_7:
    # Intersect1 28 outline → Intersect1 28 (new body)
    with BuildSketch(Plane.YZ.offset(INTERSECT1_START)):
        Polygon((0, 275), (25, 275), (50, 300), (0, 300), align=None)
    extrude(amount=INTERSECT1_28_DEPTH)

    # Intersect1 29 outline → Intersect1 29 (add)
    with BuildSketch(Plane.YZ.offset(INTERSECT1_START)):
        Polygon((0, 275), (0, 250), (25, 275), align=None)
    extrude(amount=INTERSECT1_29_DEPTH)

    # Intersect1 30 outline → Intersect1 30 (add)
    with BuildSketch(Plane.YZ.offset(INTERSECT1_START_2)):
        with Locations((6.25, 268.75)):
            Circle(INTERSECT1_30_OUTLINE_R)
    extrude(amount=INTERSECT1_30_DEPTH)

    # Intersect1 31 outline → Intersect1 31 (add)
    with BuildSketch(Plane.XY.offset(INTERSECT1_START_4)):
        Polygon((-275, 25), (-300, 50), (-300, 0), (-275, 0), align=None)
    extrude(amount=INTERSECT1_31_DEPTH)

    # Intersect1 32 outline → Intersect1 32 (add)
    with BuildSketch(Plane.XY.offset(INTERSECT1_START_8)):
        Polygon((-250, 0), (-275, 25), (-275, 0), align=None)
    extrude(amount=INTERSECT1_32_DEPTH)

    # Intersect1 33 outline → Intersect1 33 (add)
    with BuildSketch(Plane.XY.offset(INTERSECT1_START_9)):
        with Locations((-268.75, 6.25)):
            Circle(INTERSECT1_33_OUTLINE_R)
    extrude(amount=INTERSECT1_33_DEPTH)


with BuildPart() as body_8:
    # Intersect1 34 outline → Intersect1 34 (new body)
    with BuildSketch(Plane.XY.offset(INTERSECT1_START_4)):
        Polygon((275, 0), (300, 0), (300, 50), (275, 25), align=None)
    extrude(amount=INTERSECT1_34_DEPTH)

    # Intersect1 35 outline → Intersect1 35 (add)
    with BuildSketch(Plane.XY.offset(INTERSECT1_START_8)):
        Polygon((250, 0), (275, 0), (275, 25), align=None)
    extrude(amount=INTERSECT1_35_DEPTH)

    # Intersect1 36 outline → Intersect1 36 (add)
    with BuildSketch(Plane.XY.offset(INTERSECT1_START_9)):
        with Locations((268.75, 6.25)):
            Circle(INTERSECT1_36_OUTLINE_R)
    extrude(amount=INTERSECT1_36_DEPTH)

    # Intersect1 37 outline → Intersect1 37 (add)
    with BuildSketch(Plane.YZ.offset(INTERSECT1_START_4)):
        Polygon((0, 275), (25, 275), (50, 300), (0, 300), align=None)
    extrude(amount=INTERSECT1_37_DEPTH)

    # Intersect1 38 outline → Intersect1 38 (add)
    with BuildSketch(Plane.YZ.offset(INTERSECT1_START_8)):
        Polygon((0, 275), (0, 250), (25, 275), align=None)
    extrude(amount=INTERSECT1_38_DEPTH)

    # Intersect1 39 outline → Intersect1 39 (add)
    with BuildSketch(Plane.YZ.offset(INTERSECT1_START_9)):
        with Locations((6.25, 268.75)):
            Circle(INTERSECT1_39_OUTLINE_R)
    extrude(amount=INTERSECT1_39_DEPTH)


solid = Compound([part_1.part, body_2_2.part, body_3.part, body_4.part, body_5.part, body_6.part, body_7.part, body_8.part])
